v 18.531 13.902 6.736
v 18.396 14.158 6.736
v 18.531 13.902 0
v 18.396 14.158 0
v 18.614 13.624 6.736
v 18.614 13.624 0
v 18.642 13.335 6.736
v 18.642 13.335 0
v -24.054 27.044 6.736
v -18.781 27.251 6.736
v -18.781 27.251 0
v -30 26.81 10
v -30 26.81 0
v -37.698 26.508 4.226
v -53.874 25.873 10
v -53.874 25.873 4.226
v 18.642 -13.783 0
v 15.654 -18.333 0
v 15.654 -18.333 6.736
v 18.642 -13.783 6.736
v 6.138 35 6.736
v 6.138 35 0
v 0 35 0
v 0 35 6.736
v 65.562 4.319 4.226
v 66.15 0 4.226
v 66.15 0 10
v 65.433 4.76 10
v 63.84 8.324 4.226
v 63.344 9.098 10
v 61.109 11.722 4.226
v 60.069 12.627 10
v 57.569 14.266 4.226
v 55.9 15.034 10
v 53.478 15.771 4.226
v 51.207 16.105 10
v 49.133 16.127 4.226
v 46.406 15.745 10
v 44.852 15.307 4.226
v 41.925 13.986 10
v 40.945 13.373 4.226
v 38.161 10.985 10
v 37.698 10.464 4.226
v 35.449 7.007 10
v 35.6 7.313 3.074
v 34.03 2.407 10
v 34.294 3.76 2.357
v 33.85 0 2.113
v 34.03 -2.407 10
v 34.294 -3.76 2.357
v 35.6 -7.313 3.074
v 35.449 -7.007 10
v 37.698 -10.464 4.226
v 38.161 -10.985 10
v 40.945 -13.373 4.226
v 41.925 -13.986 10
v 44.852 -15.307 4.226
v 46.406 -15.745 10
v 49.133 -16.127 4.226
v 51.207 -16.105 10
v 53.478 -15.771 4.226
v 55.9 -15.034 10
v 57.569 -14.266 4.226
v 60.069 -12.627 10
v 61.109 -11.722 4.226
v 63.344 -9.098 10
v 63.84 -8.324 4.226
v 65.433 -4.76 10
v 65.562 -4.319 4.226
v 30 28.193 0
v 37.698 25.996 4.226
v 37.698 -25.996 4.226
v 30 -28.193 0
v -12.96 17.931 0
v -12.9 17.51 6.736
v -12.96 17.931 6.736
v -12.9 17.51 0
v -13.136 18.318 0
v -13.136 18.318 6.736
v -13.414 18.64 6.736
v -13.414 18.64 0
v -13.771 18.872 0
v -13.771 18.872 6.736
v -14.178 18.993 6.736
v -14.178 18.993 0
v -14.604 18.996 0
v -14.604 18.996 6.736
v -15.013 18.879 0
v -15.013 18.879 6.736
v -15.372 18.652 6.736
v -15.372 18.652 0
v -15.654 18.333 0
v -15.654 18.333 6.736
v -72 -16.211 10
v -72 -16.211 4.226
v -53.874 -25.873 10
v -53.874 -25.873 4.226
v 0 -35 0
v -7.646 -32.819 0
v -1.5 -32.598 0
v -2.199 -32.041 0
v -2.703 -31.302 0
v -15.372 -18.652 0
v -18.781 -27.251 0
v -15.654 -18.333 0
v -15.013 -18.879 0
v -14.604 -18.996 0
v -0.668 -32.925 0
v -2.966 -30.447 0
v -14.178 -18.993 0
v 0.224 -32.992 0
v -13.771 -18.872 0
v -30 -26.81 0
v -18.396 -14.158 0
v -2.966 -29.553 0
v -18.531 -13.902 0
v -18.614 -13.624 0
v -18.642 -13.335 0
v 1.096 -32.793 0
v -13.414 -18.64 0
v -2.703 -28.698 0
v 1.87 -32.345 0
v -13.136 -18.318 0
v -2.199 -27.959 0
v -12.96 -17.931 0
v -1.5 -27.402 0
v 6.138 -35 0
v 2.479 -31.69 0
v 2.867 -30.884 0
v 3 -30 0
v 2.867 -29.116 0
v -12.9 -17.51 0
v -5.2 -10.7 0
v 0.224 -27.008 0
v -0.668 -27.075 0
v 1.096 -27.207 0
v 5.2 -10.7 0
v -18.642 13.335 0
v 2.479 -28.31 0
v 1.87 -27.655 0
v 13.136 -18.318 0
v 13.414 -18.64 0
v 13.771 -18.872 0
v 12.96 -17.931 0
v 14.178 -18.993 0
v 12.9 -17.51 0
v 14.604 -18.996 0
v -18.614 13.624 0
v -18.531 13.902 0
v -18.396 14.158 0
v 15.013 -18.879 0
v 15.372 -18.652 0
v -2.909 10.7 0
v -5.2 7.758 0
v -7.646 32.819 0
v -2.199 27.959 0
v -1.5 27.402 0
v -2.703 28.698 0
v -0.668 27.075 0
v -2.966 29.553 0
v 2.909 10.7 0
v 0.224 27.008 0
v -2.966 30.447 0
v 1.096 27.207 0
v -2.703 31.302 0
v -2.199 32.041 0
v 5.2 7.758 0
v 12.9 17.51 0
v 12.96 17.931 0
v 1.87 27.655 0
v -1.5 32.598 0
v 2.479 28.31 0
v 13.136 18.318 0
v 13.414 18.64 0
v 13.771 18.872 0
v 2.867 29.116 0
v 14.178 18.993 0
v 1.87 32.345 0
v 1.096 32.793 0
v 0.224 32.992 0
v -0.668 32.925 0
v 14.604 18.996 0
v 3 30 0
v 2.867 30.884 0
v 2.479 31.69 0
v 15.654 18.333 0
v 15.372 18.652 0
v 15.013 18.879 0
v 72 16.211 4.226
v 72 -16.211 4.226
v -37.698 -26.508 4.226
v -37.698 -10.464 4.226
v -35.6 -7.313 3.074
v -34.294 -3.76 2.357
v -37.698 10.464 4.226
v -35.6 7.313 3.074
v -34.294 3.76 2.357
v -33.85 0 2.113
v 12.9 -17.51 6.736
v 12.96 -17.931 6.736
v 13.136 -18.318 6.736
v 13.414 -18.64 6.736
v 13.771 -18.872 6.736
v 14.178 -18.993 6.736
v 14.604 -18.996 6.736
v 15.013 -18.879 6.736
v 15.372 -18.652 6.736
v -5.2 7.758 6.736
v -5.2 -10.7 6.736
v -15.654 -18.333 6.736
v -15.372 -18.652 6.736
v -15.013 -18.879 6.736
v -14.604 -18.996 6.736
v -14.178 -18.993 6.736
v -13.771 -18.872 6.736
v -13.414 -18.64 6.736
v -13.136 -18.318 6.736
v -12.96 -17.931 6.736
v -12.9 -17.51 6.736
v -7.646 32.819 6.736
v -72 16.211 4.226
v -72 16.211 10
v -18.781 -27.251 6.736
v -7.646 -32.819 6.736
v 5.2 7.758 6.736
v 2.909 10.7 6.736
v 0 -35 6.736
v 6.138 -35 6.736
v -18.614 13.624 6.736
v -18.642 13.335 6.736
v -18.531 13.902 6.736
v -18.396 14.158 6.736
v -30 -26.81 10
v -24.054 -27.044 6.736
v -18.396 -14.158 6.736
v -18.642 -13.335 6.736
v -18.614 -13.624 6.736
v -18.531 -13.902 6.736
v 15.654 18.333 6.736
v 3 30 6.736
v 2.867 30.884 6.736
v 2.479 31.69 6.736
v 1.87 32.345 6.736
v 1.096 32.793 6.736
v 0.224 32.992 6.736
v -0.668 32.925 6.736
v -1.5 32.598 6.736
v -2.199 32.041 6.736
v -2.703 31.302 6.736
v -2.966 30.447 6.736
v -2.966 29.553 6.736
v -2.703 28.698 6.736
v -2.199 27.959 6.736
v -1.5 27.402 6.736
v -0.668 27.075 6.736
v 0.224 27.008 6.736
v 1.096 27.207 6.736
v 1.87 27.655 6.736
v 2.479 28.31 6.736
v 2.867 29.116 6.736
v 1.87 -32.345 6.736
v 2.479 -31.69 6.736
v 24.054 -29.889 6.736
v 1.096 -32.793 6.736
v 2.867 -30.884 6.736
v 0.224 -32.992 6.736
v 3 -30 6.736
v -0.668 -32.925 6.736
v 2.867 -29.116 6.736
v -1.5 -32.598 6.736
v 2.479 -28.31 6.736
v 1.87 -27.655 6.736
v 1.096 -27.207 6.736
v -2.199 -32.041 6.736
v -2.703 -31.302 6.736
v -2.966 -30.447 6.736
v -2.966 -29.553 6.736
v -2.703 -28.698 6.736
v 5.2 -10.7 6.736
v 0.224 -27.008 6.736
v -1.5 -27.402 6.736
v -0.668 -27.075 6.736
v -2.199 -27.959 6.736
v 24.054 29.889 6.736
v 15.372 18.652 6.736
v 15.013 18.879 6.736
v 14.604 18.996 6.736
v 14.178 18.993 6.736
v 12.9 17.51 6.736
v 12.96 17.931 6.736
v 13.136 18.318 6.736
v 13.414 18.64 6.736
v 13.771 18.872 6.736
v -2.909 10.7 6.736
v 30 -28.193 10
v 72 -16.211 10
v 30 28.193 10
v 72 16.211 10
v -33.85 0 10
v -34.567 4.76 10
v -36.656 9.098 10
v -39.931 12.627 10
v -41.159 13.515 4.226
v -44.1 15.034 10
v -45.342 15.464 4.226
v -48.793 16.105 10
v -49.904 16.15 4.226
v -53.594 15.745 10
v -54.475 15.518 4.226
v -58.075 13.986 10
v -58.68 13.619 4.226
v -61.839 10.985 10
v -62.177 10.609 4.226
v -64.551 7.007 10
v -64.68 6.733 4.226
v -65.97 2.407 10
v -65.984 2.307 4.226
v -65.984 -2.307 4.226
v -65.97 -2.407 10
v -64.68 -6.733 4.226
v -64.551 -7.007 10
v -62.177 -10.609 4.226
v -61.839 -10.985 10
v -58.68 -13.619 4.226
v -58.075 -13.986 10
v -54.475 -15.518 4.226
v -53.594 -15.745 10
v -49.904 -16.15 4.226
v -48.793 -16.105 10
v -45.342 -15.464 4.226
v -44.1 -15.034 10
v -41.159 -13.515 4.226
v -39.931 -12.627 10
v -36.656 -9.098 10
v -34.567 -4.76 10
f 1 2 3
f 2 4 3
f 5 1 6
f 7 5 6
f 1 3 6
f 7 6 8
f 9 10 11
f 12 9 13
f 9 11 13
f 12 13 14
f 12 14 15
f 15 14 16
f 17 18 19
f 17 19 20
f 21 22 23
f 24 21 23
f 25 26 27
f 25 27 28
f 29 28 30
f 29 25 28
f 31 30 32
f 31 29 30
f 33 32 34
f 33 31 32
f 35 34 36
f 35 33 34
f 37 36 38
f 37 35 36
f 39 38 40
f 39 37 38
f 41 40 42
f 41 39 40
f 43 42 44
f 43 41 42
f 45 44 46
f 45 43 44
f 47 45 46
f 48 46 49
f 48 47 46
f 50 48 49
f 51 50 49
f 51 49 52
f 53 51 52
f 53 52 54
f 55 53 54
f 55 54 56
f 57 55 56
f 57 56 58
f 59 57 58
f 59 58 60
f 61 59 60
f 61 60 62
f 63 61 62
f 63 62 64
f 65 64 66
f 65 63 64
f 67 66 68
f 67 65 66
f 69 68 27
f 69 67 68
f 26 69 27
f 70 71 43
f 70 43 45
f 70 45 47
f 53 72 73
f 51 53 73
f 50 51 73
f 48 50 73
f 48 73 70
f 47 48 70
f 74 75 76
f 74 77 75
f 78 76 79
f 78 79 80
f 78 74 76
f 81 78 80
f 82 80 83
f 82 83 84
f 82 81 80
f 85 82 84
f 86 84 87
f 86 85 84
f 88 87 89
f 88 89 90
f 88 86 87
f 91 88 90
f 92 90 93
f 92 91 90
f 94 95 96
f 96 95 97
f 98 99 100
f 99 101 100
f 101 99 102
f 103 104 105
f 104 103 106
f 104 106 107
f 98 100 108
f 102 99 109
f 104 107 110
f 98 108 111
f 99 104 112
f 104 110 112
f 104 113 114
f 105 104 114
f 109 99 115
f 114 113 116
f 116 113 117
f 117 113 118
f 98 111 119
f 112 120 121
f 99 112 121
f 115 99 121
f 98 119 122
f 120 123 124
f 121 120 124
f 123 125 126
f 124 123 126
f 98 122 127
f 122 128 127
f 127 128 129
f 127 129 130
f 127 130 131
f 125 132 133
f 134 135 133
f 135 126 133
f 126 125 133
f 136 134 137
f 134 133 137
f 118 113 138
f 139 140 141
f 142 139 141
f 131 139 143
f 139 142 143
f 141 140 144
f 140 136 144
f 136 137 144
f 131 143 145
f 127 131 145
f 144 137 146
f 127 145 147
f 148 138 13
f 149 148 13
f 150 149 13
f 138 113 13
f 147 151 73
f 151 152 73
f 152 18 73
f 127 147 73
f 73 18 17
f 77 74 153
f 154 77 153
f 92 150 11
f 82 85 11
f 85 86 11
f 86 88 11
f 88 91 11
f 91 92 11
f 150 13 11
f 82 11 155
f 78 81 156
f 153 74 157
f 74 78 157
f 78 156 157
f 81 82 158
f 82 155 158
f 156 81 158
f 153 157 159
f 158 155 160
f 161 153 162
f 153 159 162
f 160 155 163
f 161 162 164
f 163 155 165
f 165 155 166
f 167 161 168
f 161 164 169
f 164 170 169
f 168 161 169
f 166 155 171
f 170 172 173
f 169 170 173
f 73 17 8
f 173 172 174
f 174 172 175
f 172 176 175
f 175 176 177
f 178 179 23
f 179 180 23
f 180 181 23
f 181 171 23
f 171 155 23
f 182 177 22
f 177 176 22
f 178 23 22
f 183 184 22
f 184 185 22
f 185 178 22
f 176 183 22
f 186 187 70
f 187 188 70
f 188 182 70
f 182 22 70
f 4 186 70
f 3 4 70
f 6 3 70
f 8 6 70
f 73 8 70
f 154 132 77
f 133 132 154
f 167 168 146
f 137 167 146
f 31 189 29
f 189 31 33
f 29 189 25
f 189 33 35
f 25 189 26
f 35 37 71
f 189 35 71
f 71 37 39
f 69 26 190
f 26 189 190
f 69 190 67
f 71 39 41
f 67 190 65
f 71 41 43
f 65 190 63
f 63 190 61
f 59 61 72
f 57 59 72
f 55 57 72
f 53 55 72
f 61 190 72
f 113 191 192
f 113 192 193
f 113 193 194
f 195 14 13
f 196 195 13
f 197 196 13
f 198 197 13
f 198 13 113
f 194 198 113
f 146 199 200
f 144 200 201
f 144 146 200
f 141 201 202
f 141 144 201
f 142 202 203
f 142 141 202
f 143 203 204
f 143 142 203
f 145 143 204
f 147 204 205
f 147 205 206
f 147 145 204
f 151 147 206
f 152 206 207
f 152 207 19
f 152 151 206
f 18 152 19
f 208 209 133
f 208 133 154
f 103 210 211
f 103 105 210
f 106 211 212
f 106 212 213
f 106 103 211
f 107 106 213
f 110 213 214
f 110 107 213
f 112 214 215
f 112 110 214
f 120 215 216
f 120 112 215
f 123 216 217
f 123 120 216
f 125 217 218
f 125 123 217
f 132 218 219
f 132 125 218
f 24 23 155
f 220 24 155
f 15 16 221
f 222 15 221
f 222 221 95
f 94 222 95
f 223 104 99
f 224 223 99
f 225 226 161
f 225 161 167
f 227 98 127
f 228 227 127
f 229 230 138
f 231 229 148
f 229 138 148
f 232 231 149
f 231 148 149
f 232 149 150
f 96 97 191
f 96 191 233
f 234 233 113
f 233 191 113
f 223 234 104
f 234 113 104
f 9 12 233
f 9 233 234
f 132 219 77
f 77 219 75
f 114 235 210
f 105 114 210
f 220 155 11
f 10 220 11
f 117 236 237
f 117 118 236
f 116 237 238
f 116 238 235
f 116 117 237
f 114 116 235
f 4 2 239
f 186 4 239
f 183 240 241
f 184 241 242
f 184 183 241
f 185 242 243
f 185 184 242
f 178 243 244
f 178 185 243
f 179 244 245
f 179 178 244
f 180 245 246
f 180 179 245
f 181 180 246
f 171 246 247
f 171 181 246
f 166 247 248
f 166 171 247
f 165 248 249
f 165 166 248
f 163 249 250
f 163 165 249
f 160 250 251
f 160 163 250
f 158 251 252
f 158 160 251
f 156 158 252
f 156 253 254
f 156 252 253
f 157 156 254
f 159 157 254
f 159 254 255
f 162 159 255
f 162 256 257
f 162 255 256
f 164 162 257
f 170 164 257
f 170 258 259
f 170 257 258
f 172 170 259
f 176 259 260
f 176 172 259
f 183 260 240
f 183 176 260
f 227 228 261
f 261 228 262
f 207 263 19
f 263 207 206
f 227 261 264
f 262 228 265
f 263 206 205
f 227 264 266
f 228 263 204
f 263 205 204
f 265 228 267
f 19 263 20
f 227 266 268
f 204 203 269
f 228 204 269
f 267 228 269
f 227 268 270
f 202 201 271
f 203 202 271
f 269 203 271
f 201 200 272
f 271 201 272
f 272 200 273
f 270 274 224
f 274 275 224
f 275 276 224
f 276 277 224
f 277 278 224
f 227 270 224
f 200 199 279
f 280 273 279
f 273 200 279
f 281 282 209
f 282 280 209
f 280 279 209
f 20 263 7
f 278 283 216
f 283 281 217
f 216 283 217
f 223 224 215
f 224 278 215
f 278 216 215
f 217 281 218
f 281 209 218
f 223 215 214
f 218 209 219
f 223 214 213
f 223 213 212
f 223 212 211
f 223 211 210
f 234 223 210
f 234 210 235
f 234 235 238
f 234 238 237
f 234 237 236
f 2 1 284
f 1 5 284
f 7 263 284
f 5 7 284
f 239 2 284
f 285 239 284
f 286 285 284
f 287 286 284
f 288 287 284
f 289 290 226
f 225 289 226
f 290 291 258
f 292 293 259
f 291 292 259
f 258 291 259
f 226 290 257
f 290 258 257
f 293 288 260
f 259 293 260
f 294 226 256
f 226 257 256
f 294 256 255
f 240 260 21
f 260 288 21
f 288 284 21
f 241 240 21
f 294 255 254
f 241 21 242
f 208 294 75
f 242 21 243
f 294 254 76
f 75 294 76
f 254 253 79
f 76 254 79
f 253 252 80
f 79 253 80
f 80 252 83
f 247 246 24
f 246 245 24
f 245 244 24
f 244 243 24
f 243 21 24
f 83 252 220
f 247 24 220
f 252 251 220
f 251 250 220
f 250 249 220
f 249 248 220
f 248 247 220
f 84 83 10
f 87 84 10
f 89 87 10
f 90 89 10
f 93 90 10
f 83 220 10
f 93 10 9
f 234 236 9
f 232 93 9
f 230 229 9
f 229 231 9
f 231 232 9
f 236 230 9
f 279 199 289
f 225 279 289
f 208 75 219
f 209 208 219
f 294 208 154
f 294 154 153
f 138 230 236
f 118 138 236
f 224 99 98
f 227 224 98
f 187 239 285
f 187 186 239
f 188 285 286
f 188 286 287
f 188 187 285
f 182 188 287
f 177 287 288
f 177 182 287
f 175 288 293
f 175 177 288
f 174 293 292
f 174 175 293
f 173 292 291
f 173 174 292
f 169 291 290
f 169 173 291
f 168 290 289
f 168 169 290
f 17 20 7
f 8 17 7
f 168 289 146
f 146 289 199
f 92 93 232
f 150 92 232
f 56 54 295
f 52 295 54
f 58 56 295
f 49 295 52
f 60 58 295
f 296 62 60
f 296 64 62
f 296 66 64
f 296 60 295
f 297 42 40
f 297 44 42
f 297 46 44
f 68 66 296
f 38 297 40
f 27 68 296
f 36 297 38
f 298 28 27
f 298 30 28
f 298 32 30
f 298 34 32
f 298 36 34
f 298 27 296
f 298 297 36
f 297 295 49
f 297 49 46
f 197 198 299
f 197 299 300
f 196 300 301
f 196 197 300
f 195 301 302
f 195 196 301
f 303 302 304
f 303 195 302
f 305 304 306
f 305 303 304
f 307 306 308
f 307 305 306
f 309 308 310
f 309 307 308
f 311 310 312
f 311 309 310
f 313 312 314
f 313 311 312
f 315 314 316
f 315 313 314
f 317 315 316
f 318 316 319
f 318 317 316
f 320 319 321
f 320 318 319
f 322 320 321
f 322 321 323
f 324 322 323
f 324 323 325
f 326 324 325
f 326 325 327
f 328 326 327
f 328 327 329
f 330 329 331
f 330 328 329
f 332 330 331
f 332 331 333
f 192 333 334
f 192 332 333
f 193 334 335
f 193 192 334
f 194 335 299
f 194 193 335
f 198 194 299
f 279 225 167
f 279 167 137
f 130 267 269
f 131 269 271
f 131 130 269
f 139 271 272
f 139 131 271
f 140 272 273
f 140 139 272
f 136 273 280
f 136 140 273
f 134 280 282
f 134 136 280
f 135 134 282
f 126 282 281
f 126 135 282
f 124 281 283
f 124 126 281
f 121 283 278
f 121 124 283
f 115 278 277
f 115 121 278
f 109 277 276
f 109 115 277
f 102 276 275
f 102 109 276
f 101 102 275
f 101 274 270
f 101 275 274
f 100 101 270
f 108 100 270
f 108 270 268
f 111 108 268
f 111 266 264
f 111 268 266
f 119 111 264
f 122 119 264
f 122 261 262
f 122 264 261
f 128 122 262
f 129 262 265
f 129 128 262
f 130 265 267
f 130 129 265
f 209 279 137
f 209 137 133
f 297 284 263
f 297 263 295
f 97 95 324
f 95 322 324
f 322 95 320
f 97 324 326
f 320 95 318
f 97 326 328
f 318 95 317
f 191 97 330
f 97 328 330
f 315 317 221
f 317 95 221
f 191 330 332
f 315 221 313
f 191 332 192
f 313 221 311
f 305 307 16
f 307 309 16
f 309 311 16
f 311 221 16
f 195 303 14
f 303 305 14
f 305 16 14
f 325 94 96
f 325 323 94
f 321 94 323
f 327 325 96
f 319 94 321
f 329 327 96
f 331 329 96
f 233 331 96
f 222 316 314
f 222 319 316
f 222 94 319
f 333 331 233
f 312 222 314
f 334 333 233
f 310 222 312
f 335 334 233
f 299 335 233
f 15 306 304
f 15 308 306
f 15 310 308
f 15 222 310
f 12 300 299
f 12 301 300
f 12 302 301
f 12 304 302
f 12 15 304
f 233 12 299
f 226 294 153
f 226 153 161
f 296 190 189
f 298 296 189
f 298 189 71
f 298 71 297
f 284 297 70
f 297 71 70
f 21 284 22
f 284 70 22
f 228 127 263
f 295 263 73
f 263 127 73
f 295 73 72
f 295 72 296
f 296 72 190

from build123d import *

# Parameters (mm, degrees)
SKETCH1_R               = 3
SKETCH1_R_2             = 16.15
BOSS_EXTRUDE1_DEPTH     = 10
CUT_EXTRUDE1_DEPTH      = 36
CUT_EXTRUDE1_DEPTH_BACK = 36
CUT_EXTRUDE2_DEPTH      = 4.263908078
CUT_EXTRUDE2_DEPTH_BACK = 7.736091922
CUT_EXTRUDE3_DEPTH      = 4.263908078
CUT_EXTRUDE3_DEPTH_BACK = 7.736091922
FILLET1_R               = 1.5


with BuildPart() as part:
    # Sketch1 → Boss-Extrude1 (new body)
    with BuildSketch(Plane.XY):
        Polygon((-72, 16.21061599), (-72, -16.21061599), (-53.874481608, -25.873120341), (-18.780890439, -27.25079114), (-7.646290238, -32.818629475), (0, -35), (6.138156767, -35), (72, -16.21061599), (72, 16.21061599), (6.138156767, 35), (0, 35), (-7.646290238, 32.818629475), (-18.780890439, 27.25079114), (-53.874481608, 25.873120341), align=None)
        with Locations((0, 30)):
            Circle(SKETCH1_R, mode=Mode.SUBTRACT)
        with Locations((-50, 0)):
            Circle(SKETCH1_R_2, mode=Mode.SUBTRACT)
        with Locations((0, -30)):
            Circle(SKETCH1_R, mode=Mode.SUBTRACT)
        with Locations((50, 0)):
            Circle(SKETCH1_R_2, mode=Mode.SUBTRACT)
    extrude(amount=BOSS_EXTRUDE1_DEPTH)

    # Sketch2 → Cut-Extrude1 (cut, two sides)
    with BuildSketch(Plane(origin=(0, 0, 0), x_dir=(1, 0, 0), z_dir=(0, 1, 0))) as cut_extrude1_sk:
        Polygon((-30, -10), (-24.053688771, -6.736091922), (4.484766303, -6.736091922), (24.053688771, -6.736091922), (30, -10), align=None)
        Polygon((-72, 0), (-72, -4.2256576), (-37.698462898, -4.2256576), (-30, 0), align=None)
        Polygon((30, 0), (72, 0), (72, -4.2256576), (37.698462898, -4.2256576), align=None)
    extrude(amount=CUT_EXTRUDE1_DEPTH, mode=Mode.SUBTRACT)
    extrude(cut_extrude1_sk.sketch, amount=-CUT_EXTRUDE1_DEPTH_BACK, mode=Mode.SUBTRACT)

    # Sketch3 → Cut-Extrude2 (cut, two sides)
    with BuildSketch(Plane.XY.offset(6.736091922)) as cut_extrude2_sk:
        Polygon((5.2, -10.7), (-5.2, -10.7), (-5.2, 7.758003241), (-2.908652734, 10.7), (2.908652734, 10.7), (5.2, 7.758003241), align=None)
    extrude(amount=CUT_EXTRUDE2_DEPTH, mode=Mode.SUBTRACT)
    extrude(cut_extrude2_sk.sketch, amount=-CUT_EXTRUDE2_DEPTH_BACK, mode=Mode.SUBTRACT)

    # Sketch4 → Cut-Extrude3 (cut, two sides)
    with BuildSketch(Plane.XY.offset(6.736091922)) as cut_extrude3_sk:
        Polygon((-18.641801382, 13.783435693), (-18.641801382, -13.783435693), (-12.900018937, -22.526604416), (-12.900018937, 22.526604416), align=None)
        Polygon((18.641801382, 13.783435693), (12.900018937, 22.526604416), (12.900018937, -22.526604416), (18.641801382, -13.783435693), align=None)
    extrude(amount=CUT_EXTRUDE3_DEPTH, mode=Mode.SUBTRACT)
    extrude(cut_extrude3_sk.sketch, amount=-CUT_EXTRUDE3_DEPTH_BACK, mode=Mode.SUBTRACT)

    # Fillet1
    fillet1_edges = [part.edges().sort_by_distance(p)[0] for p in [
        (-12.900018937, -22.526604416, 3.368045961),
        (-18.641801382, -13.783435693, 3.368045961),
        (-18.641801382, 13.783435693, 3.368045961),
        (-12.900018937, 22.526604416, 3.368045961),
        (18.641801382, 13.783435693, 3.368045961),
        (12.900018937, -22.526604416, 3.368045961),
        (12.900018937, 22.526604416, 3.368045961),
    ]]
    fillet(fillet1_edges, radius=FILLET1_R)


solid = part.part
